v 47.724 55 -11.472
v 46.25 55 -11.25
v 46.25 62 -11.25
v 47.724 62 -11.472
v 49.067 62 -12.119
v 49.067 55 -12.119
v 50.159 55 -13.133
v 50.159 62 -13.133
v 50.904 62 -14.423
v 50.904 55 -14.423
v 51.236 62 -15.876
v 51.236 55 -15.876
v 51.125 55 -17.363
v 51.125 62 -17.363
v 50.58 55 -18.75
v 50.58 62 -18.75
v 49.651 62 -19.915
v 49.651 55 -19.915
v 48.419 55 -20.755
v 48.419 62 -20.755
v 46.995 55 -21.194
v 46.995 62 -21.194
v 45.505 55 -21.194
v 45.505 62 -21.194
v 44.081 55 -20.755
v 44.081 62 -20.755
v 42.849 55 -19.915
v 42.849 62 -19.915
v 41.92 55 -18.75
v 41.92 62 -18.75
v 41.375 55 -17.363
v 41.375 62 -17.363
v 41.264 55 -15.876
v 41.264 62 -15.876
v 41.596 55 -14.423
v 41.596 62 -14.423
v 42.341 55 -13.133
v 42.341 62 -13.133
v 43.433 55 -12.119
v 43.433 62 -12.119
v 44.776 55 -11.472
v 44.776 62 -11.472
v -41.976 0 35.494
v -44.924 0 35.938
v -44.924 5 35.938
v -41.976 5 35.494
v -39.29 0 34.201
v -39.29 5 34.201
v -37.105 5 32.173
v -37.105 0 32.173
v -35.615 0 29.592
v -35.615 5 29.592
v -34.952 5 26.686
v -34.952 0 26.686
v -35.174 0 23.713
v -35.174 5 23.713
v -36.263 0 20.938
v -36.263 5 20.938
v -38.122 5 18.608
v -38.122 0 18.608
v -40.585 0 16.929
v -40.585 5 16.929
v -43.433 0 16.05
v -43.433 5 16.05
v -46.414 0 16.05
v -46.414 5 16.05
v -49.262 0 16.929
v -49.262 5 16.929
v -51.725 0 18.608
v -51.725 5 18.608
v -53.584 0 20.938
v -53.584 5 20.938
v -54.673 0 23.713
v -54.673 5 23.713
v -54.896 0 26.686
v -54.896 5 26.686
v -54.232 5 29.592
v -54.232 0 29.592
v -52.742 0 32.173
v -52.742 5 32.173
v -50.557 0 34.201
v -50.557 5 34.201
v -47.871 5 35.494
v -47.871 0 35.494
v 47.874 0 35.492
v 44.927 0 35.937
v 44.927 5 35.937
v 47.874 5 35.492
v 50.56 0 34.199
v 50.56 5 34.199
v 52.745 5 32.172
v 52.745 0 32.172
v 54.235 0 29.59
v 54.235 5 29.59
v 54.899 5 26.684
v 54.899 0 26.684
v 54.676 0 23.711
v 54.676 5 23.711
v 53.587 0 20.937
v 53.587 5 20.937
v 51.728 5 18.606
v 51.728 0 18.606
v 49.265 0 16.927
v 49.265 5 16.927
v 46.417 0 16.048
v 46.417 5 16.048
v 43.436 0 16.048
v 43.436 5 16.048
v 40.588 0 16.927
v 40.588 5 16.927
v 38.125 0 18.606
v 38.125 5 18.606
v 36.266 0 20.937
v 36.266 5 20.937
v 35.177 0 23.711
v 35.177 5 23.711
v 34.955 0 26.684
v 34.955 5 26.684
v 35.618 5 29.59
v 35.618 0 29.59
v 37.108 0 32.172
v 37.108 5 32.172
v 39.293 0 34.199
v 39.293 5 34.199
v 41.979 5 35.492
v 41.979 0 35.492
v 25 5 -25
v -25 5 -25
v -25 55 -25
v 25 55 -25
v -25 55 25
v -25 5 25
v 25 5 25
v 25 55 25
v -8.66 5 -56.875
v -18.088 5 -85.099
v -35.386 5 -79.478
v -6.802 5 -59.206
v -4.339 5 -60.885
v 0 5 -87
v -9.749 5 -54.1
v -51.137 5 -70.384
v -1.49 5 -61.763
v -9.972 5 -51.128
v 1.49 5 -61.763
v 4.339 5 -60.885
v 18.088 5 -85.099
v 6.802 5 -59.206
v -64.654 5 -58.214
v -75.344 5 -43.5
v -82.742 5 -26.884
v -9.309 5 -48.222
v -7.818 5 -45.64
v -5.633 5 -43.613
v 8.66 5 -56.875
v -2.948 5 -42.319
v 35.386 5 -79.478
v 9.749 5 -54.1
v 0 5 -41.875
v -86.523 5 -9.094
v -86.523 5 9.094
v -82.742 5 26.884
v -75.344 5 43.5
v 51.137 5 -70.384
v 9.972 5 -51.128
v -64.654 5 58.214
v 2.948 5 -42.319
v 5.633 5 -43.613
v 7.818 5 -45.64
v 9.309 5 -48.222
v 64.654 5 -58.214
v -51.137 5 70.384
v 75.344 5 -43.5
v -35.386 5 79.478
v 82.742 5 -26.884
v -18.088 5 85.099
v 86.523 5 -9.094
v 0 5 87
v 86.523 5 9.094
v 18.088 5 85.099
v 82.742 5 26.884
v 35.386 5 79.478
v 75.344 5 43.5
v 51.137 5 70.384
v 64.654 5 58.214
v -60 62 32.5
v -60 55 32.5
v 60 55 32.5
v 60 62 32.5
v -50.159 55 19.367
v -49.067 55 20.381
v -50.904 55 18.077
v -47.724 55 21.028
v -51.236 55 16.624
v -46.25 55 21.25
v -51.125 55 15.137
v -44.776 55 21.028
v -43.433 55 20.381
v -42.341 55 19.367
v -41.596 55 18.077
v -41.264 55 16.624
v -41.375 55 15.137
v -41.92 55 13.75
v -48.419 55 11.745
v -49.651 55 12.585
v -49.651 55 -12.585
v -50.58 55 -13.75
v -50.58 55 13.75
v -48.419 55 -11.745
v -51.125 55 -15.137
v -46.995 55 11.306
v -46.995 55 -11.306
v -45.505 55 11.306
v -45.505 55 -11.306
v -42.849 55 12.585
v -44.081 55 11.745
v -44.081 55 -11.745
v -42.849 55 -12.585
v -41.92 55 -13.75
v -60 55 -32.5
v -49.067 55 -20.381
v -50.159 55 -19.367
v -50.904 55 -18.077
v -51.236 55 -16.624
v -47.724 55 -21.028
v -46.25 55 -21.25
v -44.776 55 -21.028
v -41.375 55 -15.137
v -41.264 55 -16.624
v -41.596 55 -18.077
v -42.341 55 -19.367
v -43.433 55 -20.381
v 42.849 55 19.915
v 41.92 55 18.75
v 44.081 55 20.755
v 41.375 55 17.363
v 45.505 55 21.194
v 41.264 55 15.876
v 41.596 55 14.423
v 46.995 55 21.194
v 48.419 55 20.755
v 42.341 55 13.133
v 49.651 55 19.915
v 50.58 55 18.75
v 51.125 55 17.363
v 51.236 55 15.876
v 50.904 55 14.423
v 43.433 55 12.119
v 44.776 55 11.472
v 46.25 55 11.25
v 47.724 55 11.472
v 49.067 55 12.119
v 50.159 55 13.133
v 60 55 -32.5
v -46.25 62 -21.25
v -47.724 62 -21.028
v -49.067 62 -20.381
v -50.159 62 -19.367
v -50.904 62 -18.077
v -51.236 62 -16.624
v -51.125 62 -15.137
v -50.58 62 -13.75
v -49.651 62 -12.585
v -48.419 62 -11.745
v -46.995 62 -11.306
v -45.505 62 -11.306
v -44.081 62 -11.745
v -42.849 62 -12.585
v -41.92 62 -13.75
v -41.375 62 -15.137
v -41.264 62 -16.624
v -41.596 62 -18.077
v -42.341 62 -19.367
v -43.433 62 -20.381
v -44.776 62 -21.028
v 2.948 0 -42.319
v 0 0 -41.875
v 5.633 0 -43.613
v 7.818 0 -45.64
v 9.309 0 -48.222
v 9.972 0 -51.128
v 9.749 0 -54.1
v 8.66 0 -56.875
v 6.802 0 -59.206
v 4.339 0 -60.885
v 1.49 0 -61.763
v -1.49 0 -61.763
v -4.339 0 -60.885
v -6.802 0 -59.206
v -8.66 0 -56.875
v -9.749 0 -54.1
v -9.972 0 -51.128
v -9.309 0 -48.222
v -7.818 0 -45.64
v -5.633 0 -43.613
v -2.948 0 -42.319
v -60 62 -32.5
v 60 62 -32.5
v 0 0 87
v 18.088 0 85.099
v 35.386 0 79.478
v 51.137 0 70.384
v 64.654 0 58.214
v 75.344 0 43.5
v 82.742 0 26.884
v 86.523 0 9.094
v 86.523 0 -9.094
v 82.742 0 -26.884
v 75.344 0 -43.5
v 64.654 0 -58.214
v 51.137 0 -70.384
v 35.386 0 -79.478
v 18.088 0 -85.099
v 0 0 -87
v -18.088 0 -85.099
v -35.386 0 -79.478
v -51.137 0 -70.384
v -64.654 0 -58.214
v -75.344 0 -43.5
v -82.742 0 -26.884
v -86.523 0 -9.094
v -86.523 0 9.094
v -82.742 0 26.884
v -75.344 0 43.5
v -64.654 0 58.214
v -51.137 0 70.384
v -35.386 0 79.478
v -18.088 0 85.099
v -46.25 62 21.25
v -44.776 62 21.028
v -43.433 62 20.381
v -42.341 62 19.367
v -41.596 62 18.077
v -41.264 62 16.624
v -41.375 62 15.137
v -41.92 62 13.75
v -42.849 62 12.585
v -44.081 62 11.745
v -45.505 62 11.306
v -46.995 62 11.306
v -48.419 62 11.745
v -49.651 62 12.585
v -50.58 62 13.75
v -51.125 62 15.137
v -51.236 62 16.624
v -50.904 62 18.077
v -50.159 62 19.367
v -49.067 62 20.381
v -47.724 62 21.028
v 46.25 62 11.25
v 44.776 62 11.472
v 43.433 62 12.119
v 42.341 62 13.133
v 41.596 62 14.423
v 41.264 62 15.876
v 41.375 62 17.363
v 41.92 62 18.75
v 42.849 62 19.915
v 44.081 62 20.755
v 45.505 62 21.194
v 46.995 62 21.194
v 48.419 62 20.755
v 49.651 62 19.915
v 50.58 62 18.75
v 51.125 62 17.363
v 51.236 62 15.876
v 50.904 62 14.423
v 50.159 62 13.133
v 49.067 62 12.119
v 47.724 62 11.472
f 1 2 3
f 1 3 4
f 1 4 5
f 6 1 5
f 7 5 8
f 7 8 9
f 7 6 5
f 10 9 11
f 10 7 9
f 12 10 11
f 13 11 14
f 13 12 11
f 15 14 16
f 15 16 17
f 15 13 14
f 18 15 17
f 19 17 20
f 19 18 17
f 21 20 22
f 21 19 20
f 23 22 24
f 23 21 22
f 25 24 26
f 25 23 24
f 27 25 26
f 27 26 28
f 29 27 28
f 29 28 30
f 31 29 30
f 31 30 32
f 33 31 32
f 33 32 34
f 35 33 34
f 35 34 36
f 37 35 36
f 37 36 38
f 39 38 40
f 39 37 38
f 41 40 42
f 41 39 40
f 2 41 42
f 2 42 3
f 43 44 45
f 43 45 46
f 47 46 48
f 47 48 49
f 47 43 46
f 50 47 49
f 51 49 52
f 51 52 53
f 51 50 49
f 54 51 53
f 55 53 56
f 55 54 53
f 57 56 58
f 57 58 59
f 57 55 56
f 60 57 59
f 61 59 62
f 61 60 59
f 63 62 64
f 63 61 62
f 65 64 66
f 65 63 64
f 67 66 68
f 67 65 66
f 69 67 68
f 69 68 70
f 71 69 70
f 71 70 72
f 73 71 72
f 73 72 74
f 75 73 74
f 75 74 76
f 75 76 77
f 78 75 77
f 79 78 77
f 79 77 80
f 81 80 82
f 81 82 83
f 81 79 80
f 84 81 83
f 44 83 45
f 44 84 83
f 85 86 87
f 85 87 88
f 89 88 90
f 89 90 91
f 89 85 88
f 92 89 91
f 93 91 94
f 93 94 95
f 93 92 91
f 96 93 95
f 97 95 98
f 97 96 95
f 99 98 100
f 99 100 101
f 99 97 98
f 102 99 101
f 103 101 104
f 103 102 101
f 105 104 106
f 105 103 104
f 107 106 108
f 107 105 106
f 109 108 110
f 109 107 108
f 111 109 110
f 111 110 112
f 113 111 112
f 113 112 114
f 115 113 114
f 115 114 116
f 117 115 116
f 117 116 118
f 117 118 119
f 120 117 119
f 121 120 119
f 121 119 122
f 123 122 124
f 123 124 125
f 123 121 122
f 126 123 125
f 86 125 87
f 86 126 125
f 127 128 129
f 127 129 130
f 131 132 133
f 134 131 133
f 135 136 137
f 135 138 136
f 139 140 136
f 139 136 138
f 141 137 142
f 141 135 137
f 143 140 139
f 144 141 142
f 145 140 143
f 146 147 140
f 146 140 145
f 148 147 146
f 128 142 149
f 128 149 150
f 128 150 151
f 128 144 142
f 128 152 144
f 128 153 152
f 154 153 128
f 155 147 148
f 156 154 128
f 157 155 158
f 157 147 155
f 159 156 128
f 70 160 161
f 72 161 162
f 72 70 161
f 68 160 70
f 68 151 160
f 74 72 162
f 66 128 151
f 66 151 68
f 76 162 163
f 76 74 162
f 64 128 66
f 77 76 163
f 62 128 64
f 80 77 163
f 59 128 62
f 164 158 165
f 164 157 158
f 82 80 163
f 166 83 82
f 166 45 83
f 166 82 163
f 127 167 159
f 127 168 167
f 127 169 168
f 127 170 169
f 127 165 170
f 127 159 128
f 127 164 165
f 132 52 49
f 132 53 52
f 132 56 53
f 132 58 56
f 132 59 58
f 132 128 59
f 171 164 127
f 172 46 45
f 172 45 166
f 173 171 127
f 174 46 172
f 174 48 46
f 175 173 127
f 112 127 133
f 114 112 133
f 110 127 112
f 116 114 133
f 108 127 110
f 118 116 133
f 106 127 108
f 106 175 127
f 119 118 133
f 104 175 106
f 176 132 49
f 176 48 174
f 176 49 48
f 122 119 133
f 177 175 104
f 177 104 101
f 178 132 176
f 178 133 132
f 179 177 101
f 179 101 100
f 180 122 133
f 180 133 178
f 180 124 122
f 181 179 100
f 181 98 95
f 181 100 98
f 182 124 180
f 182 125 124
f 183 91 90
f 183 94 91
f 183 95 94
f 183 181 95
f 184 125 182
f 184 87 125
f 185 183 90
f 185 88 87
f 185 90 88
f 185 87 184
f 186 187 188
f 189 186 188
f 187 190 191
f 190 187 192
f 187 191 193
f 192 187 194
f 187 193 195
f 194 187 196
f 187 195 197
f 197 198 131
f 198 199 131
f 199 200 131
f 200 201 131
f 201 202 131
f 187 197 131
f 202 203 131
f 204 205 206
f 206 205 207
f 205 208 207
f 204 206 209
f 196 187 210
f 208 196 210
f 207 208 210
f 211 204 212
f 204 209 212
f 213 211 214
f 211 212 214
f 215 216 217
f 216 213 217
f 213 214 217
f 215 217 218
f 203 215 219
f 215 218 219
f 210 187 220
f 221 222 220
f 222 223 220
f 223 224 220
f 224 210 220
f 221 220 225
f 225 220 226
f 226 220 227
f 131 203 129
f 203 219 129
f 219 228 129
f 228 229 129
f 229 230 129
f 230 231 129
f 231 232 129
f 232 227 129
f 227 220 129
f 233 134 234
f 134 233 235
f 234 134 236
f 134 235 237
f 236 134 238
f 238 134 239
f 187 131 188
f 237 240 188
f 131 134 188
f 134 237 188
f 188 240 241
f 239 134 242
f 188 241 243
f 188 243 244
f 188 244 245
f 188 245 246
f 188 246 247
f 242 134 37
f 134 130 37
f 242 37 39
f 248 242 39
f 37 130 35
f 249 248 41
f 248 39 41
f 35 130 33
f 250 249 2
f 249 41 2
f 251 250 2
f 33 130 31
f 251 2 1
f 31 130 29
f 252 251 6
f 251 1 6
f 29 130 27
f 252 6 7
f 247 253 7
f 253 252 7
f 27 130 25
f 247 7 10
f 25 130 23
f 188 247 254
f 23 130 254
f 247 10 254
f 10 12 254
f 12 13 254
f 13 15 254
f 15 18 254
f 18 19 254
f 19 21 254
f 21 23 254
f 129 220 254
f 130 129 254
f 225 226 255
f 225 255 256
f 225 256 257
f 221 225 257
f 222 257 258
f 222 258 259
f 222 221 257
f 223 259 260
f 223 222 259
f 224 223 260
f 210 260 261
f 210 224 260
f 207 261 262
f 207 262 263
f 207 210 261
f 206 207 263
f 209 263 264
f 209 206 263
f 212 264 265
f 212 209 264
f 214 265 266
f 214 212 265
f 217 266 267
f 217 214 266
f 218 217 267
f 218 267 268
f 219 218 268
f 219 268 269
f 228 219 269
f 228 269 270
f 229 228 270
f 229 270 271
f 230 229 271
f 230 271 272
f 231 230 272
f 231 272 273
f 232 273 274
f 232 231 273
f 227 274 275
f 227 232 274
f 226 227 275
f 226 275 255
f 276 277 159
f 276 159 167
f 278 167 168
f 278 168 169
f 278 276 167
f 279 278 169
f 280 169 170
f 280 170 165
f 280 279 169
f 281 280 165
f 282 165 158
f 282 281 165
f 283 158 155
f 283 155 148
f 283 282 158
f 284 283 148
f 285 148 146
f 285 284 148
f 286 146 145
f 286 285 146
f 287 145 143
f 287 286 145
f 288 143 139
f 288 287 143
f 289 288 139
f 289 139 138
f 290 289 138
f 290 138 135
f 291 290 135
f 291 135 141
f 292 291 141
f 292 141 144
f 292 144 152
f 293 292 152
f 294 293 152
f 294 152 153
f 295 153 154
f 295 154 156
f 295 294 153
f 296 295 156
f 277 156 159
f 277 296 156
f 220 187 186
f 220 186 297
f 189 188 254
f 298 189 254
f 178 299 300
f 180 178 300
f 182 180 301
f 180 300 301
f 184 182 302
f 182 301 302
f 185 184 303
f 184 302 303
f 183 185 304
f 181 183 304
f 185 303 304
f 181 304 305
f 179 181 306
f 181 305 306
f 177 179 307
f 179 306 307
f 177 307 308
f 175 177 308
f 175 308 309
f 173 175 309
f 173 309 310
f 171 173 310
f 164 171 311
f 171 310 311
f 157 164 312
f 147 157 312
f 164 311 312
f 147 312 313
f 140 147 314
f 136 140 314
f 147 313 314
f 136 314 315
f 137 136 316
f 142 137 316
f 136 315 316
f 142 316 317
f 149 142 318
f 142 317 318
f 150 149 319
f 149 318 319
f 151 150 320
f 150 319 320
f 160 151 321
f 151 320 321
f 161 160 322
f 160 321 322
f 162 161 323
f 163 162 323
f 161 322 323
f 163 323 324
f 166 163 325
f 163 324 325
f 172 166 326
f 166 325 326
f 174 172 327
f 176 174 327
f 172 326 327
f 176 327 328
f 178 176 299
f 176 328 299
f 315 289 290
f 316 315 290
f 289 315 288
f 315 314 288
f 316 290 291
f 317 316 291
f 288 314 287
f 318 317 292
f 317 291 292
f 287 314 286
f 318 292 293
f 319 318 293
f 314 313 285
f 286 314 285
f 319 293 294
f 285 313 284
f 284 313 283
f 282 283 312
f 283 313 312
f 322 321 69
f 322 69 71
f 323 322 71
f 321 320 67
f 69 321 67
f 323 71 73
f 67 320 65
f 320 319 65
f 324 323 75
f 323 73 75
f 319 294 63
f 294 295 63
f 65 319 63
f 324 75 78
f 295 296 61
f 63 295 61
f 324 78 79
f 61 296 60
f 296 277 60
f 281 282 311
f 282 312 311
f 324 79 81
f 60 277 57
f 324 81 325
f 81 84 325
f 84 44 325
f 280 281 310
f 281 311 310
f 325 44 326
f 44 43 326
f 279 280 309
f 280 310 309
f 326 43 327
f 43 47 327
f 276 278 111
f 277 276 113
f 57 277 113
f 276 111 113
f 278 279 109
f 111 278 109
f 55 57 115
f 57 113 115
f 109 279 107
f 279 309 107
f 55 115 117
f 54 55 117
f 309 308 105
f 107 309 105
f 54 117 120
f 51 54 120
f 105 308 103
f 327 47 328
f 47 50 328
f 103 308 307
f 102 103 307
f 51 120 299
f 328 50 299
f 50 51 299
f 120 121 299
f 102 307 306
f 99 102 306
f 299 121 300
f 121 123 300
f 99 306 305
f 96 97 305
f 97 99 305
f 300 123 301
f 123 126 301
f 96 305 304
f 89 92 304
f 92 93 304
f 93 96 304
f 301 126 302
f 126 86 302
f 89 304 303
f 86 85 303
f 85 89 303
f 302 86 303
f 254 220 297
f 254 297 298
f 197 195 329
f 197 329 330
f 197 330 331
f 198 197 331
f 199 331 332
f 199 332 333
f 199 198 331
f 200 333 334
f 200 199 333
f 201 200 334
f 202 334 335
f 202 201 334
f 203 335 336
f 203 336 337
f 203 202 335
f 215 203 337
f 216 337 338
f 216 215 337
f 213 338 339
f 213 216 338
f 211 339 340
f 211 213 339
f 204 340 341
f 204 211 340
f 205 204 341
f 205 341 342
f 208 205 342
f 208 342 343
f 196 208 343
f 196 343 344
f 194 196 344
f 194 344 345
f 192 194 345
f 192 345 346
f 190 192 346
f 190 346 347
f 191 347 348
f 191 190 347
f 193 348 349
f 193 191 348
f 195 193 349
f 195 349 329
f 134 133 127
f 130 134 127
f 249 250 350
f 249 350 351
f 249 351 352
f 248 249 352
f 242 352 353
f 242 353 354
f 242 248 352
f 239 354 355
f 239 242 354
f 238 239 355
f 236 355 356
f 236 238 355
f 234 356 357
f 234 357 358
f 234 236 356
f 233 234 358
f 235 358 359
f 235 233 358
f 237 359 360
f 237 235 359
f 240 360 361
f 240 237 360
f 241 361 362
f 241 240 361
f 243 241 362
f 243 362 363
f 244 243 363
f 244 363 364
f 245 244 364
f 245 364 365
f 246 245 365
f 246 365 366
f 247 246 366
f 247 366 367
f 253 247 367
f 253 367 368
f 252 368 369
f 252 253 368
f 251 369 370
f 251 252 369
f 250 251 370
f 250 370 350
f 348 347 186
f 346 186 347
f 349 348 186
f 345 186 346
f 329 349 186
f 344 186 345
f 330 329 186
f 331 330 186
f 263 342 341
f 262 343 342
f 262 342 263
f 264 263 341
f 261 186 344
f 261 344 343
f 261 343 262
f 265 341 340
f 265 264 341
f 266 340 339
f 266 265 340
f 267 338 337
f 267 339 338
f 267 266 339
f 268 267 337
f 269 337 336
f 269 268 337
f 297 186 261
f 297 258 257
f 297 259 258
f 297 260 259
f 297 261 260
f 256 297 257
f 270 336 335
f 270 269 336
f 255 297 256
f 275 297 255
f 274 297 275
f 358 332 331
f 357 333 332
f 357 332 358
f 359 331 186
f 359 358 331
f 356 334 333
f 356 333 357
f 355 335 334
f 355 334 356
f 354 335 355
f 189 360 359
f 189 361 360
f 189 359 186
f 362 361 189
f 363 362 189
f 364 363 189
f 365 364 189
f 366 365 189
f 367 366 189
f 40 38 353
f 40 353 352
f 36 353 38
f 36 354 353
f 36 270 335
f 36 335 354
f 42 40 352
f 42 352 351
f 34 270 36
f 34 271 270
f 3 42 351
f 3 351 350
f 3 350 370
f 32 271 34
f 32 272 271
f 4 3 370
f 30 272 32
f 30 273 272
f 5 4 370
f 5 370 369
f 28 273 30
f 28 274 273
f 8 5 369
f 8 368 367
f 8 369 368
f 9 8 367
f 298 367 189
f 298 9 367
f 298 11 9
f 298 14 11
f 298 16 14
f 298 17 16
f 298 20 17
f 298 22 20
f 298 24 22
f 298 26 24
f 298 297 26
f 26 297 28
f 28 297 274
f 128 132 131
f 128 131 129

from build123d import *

# Parameters (mm, degrees)
SKETCH1_R           = 87
SKETCH1_R_2         = 10
BOSS_EXTRUDE1_DEPTH = 5
SKETCH2_W           = 50
SKETCH2_H           = 50
BOSS_EXTRUDE2_DEPTH = 50
SKETCH3_W           = 120
SKETCH3_H           = 65
SKETCH3_R           = 5
BOSS_EXTRUDE3_DEPTH = 7


with BuildPart() as part:
    # Sketch1 → Boss-Extrude1 (new body)
    with BuildSketch(Plane(origin=(0, 0, 0), x_dir=(1, 0, 0), z_dir=(0, 1, 0))):
        with Locations(Location((0, 0, 0), (0, 0, 270))):
            Circle(SKETCH1_R)
        with Locations(Location((0, 51.875, 0), (0, 0, 270))):
            Circle(SKETCH1_R_2, mode=Mode.SUBTRACT)
        with Locations(Location((44.926567821, -25.936633975, 0), (0, 0, 270))):
            Circle(SKETCH1_R_2, mode=Mode.SUBTRACT)
        with Locations(Location((-44.923567821, -25.938366025, 0), (0, 0, 270))):
            Circle(SKETCH1_R_2, mode=Mode.SUBTRACT)
    extrude(amount=BOSS_EXTRUDE1_DEPTH)

    # Sketch2 → Boss-Extrude2 (add)
    with BuildSketch(Plane(origin=(0, 5, 0), x_dir=(1, 0, 0), z_dir=(0, 1, 0))):
        Rectangle(SKETCH2_W, SKETCH2_H)
    extrude(amount=BOSS_EXTRUDE2_DEPTH)

    # Sketch3 → Boss-Extrude3 (add)
    with BuildSketch(Plane(origin=(0, 55, 0), x_dir=(1, 0, 0), z_dir=(0, 1, 0))):
        Rectangle(SKETCH3_W, SKETCH3_H)
        with Locations(Location((-46.25, -16.25, 0), (0, 0, 270))):
            Circle(SKETCH3_R, mode=Mode.SUBTRACT)
        with Locations(Location((-46.25, 16.25, 0), (0, 0, 90))):
            Circle(SKETCH3_R, mode=Mode.SUBTRACT)
        with Locations(Location((46.25, -16.25, 0), (0, 0, 90))):
            Circle(SKETCH3_R, mode=Mode.SUBTRACT)
        with Locations(Location((46.25, 16.25, 0), (0, 0, 270))):
            Circle(SKETCH3_R, mode=Mode.SUBTRACT)
    extrude(amount=BOSS_EXTRUDE3_DEPTH)


solid = part.part
